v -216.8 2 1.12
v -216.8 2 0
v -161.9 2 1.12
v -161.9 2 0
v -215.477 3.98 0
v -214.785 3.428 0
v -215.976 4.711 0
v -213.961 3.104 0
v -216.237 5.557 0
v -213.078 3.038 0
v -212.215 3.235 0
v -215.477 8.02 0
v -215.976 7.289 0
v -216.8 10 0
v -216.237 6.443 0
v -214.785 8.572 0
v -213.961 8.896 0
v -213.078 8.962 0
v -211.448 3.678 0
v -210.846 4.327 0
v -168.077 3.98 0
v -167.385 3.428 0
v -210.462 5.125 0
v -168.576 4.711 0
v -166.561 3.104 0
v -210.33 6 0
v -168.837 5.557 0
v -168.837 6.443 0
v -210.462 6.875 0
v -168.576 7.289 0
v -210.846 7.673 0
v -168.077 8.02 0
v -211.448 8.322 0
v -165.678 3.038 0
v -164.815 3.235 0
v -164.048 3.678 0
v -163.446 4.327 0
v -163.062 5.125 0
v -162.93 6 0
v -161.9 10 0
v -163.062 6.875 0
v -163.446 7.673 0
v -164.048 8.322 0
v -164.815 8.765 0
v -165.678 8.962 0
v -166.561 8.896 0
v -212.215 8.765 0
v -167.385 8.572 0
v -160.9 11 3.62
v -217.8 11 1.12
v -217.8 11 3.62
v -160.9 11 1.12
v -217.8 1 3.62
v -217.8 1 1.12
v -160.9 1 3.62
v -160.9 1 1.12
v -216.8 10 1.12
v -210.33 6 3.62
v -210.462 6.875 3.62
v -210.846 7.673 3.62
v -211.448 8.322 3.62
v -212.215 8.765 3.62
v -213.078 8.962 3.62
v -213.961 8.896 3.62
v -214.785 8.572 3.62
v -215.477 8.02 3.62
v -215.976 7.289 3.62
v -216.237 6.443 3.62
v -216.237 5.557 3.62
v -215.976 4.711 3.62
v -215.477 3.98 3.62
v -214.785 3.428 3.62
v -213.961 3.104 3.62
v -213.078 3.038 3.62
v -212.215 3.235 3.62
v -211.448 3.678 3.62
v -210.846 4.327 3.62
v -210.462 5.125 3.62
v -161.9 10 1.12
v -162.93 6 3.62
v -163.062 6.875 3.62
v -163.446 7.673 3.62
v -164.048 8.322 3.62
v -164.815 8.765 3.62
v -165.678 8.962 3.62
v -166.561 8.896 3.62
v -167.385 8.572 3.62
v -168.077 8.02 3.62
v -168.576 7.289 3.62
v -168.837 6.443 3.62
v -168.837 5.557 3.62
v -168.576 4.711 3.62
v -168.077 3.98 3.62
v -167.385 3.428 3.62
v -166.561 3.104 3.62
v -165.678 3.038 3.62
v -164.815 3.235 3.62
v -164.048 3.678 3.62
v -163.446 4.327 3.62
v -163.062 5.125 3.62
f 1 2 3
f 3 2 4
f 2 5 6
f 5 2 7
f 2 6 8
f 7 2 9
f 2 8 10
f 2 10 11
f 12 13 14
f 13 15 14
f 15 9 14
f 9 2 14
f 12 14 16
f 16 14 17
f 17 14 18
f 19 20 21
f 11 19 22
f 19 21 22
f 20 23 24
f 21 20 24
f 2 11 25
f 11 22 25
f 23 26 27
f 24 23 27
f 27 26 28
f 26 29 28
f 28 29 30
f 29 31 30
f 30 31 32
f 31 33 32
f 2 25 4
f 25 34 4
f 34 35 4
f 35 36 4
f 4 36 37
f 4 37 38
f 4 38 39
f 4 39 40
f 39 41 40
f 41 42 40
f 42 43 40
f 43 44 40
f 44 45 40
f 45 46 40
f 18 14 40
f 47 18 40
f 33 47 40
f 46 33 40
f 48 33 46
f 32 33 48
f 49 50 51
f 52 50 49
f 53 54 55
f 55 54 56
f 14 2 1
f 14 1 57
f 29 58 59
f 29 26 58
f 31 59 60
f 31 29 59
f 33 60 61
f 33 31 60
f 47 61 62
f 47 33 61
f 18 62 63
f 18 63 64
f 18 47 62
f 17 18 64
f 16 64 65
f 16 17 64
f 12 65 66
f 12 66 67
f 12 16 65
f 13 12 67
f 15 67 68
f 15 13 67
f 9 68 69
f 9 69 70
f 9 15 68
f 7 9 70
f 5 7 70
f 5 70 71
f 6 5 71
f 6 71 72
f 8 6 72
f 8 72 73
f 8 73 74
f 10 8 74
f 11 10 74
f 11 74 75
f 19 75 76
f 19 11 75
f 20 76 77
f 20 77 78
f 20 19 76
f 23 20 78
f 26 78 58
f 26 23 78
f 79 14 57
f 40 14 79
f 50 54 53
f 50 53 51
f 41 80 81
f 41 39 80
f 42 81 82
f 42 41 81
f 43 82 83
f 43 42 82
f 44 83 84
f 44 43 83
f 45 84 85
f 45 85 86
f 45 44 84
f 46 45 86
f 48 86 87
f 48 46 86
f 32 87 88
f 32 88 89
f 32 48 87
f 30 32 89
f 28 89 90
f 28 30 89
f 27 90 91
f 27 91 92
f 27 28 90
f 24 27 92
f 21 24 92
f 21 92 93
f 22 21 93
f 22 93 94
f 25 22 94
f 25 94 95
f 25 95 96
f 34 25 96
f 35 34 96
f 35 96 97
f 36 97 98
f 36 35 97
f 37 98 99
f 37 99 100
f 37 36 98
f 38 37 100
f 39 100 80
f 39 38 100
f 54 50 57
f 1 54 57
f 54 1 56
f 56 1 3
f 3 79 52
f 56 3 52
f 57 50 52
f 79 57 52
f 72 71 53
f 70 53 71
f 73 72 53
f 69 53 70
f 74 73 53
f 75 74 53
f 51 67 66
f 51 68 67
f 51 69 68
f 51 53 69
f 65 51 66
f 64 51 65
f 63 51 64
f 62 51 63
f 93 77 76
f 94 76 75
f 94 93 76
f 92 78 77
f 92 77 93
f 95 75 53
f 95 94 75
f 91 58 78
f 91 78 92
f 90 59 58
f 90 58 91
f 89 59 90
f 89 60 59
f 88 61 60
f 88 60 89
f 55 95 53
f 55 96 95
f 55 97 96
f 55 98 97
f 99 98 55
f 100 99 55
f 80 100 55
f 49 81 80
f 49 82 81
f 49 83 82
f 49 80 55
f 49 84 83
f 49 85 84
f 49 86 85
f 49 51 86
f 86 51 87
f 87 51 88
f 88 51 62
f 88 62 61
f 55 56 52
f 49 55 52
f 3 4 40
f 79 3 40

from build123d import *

# Parameters (mm, degrees)
SKETCH1_W           = 54.9
SKETCH1_H           = 8
SKETCH1_R           = 2.97
BOSS_EXTRUDE1_DEPTH = 1.12
SKETCH2_W           = 56.9
SKETCH2_H           = 10
SKETCH2_R           = 2.97
BOSS_EXTRUDE3_DEPTH = 2.5


with BuildPart() as part:
    # Sketch1 → Boss-Extrude1 (new body)
    with BuildSketch(Plane.XY):
        with Locations((-189.35, 6)):
            Rectangle(SKETCH1_W, SKETCH1_H)
        with Locations((-165.9, 6)):
            Circle(SKETCH1_R, mode=Mode.SUBTRACT)
        with Locations((-213.3, 6)):
            Circle(SKETCH1_R, mode=Mode.SUBTRACT)
    extrude(amount=BOSS_EXTRUDE1_DEPTH)

    # Sketch2 → Boss-Extrude3 (add)
    with BuildSketch(Plane.XY.offset(1.12)):
        with Locations((-189.35, 6)):
            Rectangle(SKETCH2_W, SKETCH2_H)
        with Locations((-213.3, 6)):
            Circle(SKETCH2_R, mode=Mode.SUBTRACT)
        with Locations((-165.9, 6)):
            Circle(SKETCH2_R, mode=Mode.SUBTRACT)
    extrude(amount=BOSS_EXTRUDE3_DEPTH)


solid = part.part
